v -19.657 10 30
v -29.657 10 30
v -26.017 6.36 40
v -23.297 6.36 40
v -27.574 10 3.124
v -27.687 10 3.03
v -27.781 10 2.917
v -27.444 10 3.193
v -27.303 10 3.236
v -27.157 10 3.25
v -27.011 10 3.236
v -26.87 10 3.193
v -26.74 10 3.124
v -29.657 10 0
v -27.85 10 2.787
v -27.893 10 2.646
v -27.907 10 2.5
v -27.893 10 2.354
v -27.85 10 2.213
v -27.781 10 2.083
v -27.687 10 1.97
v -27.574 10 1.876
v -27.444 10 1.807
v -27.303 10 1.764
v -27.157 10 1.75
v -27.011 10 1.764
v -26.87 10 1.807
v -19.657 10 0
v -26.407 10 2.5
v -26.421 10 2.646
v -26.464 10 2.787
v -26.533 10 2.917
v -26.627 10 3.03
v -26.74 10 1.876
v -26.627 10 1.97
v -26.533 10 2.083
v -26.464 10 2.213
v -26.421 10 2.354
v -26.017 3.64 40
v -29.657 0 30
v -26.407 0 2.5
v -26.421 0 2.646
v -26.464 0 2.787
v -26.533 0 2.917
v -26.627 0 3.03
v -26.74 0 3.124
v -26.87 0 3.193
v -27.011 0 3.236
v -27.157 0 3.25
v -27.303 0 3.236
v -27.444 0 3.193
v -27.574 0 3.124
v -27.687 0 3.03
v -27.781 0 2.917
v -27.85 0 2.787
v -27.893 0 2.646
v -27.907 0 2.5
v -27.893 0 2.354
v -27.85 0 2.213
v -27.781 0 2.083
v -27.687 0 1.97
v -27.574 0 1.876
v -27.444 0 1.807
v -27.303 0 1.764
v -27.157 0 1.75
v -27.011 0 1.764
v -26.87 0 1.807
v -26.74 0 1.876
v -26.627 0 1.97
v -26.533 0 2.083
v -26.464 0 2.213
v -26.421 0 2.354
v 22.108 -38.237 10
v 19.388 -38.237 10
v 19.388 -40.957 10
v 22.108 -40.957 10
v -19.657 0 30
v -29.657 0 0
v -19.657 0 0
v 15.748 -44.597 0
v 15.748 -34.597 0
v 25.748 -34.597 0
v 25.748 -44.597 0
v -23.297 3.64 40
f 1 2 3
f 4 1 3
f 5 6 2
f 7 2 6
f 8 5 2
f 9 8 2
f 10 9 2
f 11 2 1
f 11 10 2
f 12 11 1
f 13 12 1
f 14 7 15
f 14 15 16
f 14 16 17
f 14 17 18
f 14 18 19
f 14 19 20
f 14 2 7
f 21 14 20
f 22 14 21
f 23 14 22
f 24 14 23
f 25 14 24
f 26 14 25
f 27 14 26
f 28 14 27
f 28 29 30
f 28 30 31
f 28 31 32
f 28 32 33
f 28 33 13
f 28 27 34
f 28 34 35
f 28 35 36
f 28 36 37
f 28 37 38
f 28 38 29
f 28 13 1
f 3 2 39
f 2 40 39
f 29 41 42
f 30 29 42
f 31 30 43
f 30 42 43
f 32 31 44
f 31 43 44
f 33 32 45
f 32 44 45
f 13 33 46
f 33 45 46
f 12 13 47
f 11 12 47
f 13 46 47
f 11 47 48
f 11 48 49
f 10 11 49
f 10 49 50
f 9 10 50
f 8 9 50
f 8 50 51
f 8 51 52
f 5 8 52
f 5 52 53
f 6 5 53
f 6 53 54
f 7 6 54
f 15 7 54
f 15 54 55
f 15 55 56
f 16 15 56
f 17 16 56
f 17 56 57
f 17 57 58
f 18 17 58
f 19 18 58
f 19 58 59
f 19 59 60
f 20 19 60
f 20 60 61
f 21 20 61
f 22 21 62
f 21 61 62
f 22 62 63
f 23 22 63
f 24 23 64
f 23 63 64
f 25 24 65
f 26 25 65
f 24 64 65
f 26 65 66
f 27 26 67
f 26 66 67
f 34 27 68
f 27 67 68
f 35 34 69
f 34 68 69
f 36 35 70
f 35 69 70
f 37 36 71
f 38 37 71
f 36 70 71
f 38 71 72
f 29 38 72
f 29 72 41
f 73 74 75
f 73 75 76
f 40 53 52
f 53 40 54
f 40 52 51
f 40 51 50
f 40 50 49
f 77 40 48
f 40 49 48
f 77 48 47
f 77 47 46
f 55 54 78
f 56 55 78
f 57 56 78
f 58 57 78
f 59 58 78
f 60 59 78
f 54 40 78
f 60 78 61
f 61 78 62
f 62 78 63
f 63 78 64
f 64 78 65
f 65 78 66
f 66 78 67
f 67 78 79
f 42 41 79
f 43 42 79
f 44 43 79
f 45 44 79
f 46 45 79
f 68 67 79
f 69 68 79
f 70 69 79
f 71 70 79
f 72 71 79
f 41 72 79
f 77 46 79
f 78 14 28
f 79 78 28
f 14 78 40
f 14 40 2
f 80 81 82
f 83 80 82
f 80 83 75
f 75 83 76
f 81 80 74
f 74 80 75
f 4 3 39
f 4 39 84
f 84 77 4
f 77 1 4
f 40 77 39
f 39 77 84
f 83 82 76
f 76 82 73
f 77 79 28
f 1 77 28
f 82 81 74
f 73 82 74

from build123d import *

# Parameters (mm, degrees)
F0_W     = 10
F0_H     = 10
F1_DEPTH = 30
F2_W     = 10
F2_H     = 10
F3_DEPTH = 10
F3_TAPER = 20
F4_R     = 0.75
F5_DEPTH = 25
F6_W     = 10
F6_H     = 10
F7_DEPTH = 10
F7_TAPER = 20


with BuildPart() as f1:
    # F0 (on Top) → F1 (new body)
    with BuildSketch(Plane.XY):
        with Locations((-24.6569485217, 5)):
            Rectangle(F0_W, F0_H)
    extrude(amount=F1_DEPTH)

    # F4 (on face) → F5 (cut)
    with BuildSketch(Plane.XZ):
        with Locations((-27.1569485217, 2.5)):
            Circle(F4_R)
    extrude(amount=-F5_DEPTH, mode=Mode.SUBTRACT)

    # F6 (on face) → F7 (join)
    with BuildSketch(Plane.XY.offset(30)):
        with Locations((-24.6569485217, 5)):
            Rectangle(F6_W, F6_H)
    extrude(amount=F7_DEPTH, taper=F7_TAPER)


with BuildPart() as f3:
    # F2 (on Top) → F3 (new body)
    with BuildSketch(Plane.XY):
        with Locations((20.7480721921, -39.5969700813)):
            Rectangle(F2_W, F2_H)
    extrude(amount=F3_DEPTH, taper=F3_TAPER)


solid = Compound([f1.part, f3.part])
